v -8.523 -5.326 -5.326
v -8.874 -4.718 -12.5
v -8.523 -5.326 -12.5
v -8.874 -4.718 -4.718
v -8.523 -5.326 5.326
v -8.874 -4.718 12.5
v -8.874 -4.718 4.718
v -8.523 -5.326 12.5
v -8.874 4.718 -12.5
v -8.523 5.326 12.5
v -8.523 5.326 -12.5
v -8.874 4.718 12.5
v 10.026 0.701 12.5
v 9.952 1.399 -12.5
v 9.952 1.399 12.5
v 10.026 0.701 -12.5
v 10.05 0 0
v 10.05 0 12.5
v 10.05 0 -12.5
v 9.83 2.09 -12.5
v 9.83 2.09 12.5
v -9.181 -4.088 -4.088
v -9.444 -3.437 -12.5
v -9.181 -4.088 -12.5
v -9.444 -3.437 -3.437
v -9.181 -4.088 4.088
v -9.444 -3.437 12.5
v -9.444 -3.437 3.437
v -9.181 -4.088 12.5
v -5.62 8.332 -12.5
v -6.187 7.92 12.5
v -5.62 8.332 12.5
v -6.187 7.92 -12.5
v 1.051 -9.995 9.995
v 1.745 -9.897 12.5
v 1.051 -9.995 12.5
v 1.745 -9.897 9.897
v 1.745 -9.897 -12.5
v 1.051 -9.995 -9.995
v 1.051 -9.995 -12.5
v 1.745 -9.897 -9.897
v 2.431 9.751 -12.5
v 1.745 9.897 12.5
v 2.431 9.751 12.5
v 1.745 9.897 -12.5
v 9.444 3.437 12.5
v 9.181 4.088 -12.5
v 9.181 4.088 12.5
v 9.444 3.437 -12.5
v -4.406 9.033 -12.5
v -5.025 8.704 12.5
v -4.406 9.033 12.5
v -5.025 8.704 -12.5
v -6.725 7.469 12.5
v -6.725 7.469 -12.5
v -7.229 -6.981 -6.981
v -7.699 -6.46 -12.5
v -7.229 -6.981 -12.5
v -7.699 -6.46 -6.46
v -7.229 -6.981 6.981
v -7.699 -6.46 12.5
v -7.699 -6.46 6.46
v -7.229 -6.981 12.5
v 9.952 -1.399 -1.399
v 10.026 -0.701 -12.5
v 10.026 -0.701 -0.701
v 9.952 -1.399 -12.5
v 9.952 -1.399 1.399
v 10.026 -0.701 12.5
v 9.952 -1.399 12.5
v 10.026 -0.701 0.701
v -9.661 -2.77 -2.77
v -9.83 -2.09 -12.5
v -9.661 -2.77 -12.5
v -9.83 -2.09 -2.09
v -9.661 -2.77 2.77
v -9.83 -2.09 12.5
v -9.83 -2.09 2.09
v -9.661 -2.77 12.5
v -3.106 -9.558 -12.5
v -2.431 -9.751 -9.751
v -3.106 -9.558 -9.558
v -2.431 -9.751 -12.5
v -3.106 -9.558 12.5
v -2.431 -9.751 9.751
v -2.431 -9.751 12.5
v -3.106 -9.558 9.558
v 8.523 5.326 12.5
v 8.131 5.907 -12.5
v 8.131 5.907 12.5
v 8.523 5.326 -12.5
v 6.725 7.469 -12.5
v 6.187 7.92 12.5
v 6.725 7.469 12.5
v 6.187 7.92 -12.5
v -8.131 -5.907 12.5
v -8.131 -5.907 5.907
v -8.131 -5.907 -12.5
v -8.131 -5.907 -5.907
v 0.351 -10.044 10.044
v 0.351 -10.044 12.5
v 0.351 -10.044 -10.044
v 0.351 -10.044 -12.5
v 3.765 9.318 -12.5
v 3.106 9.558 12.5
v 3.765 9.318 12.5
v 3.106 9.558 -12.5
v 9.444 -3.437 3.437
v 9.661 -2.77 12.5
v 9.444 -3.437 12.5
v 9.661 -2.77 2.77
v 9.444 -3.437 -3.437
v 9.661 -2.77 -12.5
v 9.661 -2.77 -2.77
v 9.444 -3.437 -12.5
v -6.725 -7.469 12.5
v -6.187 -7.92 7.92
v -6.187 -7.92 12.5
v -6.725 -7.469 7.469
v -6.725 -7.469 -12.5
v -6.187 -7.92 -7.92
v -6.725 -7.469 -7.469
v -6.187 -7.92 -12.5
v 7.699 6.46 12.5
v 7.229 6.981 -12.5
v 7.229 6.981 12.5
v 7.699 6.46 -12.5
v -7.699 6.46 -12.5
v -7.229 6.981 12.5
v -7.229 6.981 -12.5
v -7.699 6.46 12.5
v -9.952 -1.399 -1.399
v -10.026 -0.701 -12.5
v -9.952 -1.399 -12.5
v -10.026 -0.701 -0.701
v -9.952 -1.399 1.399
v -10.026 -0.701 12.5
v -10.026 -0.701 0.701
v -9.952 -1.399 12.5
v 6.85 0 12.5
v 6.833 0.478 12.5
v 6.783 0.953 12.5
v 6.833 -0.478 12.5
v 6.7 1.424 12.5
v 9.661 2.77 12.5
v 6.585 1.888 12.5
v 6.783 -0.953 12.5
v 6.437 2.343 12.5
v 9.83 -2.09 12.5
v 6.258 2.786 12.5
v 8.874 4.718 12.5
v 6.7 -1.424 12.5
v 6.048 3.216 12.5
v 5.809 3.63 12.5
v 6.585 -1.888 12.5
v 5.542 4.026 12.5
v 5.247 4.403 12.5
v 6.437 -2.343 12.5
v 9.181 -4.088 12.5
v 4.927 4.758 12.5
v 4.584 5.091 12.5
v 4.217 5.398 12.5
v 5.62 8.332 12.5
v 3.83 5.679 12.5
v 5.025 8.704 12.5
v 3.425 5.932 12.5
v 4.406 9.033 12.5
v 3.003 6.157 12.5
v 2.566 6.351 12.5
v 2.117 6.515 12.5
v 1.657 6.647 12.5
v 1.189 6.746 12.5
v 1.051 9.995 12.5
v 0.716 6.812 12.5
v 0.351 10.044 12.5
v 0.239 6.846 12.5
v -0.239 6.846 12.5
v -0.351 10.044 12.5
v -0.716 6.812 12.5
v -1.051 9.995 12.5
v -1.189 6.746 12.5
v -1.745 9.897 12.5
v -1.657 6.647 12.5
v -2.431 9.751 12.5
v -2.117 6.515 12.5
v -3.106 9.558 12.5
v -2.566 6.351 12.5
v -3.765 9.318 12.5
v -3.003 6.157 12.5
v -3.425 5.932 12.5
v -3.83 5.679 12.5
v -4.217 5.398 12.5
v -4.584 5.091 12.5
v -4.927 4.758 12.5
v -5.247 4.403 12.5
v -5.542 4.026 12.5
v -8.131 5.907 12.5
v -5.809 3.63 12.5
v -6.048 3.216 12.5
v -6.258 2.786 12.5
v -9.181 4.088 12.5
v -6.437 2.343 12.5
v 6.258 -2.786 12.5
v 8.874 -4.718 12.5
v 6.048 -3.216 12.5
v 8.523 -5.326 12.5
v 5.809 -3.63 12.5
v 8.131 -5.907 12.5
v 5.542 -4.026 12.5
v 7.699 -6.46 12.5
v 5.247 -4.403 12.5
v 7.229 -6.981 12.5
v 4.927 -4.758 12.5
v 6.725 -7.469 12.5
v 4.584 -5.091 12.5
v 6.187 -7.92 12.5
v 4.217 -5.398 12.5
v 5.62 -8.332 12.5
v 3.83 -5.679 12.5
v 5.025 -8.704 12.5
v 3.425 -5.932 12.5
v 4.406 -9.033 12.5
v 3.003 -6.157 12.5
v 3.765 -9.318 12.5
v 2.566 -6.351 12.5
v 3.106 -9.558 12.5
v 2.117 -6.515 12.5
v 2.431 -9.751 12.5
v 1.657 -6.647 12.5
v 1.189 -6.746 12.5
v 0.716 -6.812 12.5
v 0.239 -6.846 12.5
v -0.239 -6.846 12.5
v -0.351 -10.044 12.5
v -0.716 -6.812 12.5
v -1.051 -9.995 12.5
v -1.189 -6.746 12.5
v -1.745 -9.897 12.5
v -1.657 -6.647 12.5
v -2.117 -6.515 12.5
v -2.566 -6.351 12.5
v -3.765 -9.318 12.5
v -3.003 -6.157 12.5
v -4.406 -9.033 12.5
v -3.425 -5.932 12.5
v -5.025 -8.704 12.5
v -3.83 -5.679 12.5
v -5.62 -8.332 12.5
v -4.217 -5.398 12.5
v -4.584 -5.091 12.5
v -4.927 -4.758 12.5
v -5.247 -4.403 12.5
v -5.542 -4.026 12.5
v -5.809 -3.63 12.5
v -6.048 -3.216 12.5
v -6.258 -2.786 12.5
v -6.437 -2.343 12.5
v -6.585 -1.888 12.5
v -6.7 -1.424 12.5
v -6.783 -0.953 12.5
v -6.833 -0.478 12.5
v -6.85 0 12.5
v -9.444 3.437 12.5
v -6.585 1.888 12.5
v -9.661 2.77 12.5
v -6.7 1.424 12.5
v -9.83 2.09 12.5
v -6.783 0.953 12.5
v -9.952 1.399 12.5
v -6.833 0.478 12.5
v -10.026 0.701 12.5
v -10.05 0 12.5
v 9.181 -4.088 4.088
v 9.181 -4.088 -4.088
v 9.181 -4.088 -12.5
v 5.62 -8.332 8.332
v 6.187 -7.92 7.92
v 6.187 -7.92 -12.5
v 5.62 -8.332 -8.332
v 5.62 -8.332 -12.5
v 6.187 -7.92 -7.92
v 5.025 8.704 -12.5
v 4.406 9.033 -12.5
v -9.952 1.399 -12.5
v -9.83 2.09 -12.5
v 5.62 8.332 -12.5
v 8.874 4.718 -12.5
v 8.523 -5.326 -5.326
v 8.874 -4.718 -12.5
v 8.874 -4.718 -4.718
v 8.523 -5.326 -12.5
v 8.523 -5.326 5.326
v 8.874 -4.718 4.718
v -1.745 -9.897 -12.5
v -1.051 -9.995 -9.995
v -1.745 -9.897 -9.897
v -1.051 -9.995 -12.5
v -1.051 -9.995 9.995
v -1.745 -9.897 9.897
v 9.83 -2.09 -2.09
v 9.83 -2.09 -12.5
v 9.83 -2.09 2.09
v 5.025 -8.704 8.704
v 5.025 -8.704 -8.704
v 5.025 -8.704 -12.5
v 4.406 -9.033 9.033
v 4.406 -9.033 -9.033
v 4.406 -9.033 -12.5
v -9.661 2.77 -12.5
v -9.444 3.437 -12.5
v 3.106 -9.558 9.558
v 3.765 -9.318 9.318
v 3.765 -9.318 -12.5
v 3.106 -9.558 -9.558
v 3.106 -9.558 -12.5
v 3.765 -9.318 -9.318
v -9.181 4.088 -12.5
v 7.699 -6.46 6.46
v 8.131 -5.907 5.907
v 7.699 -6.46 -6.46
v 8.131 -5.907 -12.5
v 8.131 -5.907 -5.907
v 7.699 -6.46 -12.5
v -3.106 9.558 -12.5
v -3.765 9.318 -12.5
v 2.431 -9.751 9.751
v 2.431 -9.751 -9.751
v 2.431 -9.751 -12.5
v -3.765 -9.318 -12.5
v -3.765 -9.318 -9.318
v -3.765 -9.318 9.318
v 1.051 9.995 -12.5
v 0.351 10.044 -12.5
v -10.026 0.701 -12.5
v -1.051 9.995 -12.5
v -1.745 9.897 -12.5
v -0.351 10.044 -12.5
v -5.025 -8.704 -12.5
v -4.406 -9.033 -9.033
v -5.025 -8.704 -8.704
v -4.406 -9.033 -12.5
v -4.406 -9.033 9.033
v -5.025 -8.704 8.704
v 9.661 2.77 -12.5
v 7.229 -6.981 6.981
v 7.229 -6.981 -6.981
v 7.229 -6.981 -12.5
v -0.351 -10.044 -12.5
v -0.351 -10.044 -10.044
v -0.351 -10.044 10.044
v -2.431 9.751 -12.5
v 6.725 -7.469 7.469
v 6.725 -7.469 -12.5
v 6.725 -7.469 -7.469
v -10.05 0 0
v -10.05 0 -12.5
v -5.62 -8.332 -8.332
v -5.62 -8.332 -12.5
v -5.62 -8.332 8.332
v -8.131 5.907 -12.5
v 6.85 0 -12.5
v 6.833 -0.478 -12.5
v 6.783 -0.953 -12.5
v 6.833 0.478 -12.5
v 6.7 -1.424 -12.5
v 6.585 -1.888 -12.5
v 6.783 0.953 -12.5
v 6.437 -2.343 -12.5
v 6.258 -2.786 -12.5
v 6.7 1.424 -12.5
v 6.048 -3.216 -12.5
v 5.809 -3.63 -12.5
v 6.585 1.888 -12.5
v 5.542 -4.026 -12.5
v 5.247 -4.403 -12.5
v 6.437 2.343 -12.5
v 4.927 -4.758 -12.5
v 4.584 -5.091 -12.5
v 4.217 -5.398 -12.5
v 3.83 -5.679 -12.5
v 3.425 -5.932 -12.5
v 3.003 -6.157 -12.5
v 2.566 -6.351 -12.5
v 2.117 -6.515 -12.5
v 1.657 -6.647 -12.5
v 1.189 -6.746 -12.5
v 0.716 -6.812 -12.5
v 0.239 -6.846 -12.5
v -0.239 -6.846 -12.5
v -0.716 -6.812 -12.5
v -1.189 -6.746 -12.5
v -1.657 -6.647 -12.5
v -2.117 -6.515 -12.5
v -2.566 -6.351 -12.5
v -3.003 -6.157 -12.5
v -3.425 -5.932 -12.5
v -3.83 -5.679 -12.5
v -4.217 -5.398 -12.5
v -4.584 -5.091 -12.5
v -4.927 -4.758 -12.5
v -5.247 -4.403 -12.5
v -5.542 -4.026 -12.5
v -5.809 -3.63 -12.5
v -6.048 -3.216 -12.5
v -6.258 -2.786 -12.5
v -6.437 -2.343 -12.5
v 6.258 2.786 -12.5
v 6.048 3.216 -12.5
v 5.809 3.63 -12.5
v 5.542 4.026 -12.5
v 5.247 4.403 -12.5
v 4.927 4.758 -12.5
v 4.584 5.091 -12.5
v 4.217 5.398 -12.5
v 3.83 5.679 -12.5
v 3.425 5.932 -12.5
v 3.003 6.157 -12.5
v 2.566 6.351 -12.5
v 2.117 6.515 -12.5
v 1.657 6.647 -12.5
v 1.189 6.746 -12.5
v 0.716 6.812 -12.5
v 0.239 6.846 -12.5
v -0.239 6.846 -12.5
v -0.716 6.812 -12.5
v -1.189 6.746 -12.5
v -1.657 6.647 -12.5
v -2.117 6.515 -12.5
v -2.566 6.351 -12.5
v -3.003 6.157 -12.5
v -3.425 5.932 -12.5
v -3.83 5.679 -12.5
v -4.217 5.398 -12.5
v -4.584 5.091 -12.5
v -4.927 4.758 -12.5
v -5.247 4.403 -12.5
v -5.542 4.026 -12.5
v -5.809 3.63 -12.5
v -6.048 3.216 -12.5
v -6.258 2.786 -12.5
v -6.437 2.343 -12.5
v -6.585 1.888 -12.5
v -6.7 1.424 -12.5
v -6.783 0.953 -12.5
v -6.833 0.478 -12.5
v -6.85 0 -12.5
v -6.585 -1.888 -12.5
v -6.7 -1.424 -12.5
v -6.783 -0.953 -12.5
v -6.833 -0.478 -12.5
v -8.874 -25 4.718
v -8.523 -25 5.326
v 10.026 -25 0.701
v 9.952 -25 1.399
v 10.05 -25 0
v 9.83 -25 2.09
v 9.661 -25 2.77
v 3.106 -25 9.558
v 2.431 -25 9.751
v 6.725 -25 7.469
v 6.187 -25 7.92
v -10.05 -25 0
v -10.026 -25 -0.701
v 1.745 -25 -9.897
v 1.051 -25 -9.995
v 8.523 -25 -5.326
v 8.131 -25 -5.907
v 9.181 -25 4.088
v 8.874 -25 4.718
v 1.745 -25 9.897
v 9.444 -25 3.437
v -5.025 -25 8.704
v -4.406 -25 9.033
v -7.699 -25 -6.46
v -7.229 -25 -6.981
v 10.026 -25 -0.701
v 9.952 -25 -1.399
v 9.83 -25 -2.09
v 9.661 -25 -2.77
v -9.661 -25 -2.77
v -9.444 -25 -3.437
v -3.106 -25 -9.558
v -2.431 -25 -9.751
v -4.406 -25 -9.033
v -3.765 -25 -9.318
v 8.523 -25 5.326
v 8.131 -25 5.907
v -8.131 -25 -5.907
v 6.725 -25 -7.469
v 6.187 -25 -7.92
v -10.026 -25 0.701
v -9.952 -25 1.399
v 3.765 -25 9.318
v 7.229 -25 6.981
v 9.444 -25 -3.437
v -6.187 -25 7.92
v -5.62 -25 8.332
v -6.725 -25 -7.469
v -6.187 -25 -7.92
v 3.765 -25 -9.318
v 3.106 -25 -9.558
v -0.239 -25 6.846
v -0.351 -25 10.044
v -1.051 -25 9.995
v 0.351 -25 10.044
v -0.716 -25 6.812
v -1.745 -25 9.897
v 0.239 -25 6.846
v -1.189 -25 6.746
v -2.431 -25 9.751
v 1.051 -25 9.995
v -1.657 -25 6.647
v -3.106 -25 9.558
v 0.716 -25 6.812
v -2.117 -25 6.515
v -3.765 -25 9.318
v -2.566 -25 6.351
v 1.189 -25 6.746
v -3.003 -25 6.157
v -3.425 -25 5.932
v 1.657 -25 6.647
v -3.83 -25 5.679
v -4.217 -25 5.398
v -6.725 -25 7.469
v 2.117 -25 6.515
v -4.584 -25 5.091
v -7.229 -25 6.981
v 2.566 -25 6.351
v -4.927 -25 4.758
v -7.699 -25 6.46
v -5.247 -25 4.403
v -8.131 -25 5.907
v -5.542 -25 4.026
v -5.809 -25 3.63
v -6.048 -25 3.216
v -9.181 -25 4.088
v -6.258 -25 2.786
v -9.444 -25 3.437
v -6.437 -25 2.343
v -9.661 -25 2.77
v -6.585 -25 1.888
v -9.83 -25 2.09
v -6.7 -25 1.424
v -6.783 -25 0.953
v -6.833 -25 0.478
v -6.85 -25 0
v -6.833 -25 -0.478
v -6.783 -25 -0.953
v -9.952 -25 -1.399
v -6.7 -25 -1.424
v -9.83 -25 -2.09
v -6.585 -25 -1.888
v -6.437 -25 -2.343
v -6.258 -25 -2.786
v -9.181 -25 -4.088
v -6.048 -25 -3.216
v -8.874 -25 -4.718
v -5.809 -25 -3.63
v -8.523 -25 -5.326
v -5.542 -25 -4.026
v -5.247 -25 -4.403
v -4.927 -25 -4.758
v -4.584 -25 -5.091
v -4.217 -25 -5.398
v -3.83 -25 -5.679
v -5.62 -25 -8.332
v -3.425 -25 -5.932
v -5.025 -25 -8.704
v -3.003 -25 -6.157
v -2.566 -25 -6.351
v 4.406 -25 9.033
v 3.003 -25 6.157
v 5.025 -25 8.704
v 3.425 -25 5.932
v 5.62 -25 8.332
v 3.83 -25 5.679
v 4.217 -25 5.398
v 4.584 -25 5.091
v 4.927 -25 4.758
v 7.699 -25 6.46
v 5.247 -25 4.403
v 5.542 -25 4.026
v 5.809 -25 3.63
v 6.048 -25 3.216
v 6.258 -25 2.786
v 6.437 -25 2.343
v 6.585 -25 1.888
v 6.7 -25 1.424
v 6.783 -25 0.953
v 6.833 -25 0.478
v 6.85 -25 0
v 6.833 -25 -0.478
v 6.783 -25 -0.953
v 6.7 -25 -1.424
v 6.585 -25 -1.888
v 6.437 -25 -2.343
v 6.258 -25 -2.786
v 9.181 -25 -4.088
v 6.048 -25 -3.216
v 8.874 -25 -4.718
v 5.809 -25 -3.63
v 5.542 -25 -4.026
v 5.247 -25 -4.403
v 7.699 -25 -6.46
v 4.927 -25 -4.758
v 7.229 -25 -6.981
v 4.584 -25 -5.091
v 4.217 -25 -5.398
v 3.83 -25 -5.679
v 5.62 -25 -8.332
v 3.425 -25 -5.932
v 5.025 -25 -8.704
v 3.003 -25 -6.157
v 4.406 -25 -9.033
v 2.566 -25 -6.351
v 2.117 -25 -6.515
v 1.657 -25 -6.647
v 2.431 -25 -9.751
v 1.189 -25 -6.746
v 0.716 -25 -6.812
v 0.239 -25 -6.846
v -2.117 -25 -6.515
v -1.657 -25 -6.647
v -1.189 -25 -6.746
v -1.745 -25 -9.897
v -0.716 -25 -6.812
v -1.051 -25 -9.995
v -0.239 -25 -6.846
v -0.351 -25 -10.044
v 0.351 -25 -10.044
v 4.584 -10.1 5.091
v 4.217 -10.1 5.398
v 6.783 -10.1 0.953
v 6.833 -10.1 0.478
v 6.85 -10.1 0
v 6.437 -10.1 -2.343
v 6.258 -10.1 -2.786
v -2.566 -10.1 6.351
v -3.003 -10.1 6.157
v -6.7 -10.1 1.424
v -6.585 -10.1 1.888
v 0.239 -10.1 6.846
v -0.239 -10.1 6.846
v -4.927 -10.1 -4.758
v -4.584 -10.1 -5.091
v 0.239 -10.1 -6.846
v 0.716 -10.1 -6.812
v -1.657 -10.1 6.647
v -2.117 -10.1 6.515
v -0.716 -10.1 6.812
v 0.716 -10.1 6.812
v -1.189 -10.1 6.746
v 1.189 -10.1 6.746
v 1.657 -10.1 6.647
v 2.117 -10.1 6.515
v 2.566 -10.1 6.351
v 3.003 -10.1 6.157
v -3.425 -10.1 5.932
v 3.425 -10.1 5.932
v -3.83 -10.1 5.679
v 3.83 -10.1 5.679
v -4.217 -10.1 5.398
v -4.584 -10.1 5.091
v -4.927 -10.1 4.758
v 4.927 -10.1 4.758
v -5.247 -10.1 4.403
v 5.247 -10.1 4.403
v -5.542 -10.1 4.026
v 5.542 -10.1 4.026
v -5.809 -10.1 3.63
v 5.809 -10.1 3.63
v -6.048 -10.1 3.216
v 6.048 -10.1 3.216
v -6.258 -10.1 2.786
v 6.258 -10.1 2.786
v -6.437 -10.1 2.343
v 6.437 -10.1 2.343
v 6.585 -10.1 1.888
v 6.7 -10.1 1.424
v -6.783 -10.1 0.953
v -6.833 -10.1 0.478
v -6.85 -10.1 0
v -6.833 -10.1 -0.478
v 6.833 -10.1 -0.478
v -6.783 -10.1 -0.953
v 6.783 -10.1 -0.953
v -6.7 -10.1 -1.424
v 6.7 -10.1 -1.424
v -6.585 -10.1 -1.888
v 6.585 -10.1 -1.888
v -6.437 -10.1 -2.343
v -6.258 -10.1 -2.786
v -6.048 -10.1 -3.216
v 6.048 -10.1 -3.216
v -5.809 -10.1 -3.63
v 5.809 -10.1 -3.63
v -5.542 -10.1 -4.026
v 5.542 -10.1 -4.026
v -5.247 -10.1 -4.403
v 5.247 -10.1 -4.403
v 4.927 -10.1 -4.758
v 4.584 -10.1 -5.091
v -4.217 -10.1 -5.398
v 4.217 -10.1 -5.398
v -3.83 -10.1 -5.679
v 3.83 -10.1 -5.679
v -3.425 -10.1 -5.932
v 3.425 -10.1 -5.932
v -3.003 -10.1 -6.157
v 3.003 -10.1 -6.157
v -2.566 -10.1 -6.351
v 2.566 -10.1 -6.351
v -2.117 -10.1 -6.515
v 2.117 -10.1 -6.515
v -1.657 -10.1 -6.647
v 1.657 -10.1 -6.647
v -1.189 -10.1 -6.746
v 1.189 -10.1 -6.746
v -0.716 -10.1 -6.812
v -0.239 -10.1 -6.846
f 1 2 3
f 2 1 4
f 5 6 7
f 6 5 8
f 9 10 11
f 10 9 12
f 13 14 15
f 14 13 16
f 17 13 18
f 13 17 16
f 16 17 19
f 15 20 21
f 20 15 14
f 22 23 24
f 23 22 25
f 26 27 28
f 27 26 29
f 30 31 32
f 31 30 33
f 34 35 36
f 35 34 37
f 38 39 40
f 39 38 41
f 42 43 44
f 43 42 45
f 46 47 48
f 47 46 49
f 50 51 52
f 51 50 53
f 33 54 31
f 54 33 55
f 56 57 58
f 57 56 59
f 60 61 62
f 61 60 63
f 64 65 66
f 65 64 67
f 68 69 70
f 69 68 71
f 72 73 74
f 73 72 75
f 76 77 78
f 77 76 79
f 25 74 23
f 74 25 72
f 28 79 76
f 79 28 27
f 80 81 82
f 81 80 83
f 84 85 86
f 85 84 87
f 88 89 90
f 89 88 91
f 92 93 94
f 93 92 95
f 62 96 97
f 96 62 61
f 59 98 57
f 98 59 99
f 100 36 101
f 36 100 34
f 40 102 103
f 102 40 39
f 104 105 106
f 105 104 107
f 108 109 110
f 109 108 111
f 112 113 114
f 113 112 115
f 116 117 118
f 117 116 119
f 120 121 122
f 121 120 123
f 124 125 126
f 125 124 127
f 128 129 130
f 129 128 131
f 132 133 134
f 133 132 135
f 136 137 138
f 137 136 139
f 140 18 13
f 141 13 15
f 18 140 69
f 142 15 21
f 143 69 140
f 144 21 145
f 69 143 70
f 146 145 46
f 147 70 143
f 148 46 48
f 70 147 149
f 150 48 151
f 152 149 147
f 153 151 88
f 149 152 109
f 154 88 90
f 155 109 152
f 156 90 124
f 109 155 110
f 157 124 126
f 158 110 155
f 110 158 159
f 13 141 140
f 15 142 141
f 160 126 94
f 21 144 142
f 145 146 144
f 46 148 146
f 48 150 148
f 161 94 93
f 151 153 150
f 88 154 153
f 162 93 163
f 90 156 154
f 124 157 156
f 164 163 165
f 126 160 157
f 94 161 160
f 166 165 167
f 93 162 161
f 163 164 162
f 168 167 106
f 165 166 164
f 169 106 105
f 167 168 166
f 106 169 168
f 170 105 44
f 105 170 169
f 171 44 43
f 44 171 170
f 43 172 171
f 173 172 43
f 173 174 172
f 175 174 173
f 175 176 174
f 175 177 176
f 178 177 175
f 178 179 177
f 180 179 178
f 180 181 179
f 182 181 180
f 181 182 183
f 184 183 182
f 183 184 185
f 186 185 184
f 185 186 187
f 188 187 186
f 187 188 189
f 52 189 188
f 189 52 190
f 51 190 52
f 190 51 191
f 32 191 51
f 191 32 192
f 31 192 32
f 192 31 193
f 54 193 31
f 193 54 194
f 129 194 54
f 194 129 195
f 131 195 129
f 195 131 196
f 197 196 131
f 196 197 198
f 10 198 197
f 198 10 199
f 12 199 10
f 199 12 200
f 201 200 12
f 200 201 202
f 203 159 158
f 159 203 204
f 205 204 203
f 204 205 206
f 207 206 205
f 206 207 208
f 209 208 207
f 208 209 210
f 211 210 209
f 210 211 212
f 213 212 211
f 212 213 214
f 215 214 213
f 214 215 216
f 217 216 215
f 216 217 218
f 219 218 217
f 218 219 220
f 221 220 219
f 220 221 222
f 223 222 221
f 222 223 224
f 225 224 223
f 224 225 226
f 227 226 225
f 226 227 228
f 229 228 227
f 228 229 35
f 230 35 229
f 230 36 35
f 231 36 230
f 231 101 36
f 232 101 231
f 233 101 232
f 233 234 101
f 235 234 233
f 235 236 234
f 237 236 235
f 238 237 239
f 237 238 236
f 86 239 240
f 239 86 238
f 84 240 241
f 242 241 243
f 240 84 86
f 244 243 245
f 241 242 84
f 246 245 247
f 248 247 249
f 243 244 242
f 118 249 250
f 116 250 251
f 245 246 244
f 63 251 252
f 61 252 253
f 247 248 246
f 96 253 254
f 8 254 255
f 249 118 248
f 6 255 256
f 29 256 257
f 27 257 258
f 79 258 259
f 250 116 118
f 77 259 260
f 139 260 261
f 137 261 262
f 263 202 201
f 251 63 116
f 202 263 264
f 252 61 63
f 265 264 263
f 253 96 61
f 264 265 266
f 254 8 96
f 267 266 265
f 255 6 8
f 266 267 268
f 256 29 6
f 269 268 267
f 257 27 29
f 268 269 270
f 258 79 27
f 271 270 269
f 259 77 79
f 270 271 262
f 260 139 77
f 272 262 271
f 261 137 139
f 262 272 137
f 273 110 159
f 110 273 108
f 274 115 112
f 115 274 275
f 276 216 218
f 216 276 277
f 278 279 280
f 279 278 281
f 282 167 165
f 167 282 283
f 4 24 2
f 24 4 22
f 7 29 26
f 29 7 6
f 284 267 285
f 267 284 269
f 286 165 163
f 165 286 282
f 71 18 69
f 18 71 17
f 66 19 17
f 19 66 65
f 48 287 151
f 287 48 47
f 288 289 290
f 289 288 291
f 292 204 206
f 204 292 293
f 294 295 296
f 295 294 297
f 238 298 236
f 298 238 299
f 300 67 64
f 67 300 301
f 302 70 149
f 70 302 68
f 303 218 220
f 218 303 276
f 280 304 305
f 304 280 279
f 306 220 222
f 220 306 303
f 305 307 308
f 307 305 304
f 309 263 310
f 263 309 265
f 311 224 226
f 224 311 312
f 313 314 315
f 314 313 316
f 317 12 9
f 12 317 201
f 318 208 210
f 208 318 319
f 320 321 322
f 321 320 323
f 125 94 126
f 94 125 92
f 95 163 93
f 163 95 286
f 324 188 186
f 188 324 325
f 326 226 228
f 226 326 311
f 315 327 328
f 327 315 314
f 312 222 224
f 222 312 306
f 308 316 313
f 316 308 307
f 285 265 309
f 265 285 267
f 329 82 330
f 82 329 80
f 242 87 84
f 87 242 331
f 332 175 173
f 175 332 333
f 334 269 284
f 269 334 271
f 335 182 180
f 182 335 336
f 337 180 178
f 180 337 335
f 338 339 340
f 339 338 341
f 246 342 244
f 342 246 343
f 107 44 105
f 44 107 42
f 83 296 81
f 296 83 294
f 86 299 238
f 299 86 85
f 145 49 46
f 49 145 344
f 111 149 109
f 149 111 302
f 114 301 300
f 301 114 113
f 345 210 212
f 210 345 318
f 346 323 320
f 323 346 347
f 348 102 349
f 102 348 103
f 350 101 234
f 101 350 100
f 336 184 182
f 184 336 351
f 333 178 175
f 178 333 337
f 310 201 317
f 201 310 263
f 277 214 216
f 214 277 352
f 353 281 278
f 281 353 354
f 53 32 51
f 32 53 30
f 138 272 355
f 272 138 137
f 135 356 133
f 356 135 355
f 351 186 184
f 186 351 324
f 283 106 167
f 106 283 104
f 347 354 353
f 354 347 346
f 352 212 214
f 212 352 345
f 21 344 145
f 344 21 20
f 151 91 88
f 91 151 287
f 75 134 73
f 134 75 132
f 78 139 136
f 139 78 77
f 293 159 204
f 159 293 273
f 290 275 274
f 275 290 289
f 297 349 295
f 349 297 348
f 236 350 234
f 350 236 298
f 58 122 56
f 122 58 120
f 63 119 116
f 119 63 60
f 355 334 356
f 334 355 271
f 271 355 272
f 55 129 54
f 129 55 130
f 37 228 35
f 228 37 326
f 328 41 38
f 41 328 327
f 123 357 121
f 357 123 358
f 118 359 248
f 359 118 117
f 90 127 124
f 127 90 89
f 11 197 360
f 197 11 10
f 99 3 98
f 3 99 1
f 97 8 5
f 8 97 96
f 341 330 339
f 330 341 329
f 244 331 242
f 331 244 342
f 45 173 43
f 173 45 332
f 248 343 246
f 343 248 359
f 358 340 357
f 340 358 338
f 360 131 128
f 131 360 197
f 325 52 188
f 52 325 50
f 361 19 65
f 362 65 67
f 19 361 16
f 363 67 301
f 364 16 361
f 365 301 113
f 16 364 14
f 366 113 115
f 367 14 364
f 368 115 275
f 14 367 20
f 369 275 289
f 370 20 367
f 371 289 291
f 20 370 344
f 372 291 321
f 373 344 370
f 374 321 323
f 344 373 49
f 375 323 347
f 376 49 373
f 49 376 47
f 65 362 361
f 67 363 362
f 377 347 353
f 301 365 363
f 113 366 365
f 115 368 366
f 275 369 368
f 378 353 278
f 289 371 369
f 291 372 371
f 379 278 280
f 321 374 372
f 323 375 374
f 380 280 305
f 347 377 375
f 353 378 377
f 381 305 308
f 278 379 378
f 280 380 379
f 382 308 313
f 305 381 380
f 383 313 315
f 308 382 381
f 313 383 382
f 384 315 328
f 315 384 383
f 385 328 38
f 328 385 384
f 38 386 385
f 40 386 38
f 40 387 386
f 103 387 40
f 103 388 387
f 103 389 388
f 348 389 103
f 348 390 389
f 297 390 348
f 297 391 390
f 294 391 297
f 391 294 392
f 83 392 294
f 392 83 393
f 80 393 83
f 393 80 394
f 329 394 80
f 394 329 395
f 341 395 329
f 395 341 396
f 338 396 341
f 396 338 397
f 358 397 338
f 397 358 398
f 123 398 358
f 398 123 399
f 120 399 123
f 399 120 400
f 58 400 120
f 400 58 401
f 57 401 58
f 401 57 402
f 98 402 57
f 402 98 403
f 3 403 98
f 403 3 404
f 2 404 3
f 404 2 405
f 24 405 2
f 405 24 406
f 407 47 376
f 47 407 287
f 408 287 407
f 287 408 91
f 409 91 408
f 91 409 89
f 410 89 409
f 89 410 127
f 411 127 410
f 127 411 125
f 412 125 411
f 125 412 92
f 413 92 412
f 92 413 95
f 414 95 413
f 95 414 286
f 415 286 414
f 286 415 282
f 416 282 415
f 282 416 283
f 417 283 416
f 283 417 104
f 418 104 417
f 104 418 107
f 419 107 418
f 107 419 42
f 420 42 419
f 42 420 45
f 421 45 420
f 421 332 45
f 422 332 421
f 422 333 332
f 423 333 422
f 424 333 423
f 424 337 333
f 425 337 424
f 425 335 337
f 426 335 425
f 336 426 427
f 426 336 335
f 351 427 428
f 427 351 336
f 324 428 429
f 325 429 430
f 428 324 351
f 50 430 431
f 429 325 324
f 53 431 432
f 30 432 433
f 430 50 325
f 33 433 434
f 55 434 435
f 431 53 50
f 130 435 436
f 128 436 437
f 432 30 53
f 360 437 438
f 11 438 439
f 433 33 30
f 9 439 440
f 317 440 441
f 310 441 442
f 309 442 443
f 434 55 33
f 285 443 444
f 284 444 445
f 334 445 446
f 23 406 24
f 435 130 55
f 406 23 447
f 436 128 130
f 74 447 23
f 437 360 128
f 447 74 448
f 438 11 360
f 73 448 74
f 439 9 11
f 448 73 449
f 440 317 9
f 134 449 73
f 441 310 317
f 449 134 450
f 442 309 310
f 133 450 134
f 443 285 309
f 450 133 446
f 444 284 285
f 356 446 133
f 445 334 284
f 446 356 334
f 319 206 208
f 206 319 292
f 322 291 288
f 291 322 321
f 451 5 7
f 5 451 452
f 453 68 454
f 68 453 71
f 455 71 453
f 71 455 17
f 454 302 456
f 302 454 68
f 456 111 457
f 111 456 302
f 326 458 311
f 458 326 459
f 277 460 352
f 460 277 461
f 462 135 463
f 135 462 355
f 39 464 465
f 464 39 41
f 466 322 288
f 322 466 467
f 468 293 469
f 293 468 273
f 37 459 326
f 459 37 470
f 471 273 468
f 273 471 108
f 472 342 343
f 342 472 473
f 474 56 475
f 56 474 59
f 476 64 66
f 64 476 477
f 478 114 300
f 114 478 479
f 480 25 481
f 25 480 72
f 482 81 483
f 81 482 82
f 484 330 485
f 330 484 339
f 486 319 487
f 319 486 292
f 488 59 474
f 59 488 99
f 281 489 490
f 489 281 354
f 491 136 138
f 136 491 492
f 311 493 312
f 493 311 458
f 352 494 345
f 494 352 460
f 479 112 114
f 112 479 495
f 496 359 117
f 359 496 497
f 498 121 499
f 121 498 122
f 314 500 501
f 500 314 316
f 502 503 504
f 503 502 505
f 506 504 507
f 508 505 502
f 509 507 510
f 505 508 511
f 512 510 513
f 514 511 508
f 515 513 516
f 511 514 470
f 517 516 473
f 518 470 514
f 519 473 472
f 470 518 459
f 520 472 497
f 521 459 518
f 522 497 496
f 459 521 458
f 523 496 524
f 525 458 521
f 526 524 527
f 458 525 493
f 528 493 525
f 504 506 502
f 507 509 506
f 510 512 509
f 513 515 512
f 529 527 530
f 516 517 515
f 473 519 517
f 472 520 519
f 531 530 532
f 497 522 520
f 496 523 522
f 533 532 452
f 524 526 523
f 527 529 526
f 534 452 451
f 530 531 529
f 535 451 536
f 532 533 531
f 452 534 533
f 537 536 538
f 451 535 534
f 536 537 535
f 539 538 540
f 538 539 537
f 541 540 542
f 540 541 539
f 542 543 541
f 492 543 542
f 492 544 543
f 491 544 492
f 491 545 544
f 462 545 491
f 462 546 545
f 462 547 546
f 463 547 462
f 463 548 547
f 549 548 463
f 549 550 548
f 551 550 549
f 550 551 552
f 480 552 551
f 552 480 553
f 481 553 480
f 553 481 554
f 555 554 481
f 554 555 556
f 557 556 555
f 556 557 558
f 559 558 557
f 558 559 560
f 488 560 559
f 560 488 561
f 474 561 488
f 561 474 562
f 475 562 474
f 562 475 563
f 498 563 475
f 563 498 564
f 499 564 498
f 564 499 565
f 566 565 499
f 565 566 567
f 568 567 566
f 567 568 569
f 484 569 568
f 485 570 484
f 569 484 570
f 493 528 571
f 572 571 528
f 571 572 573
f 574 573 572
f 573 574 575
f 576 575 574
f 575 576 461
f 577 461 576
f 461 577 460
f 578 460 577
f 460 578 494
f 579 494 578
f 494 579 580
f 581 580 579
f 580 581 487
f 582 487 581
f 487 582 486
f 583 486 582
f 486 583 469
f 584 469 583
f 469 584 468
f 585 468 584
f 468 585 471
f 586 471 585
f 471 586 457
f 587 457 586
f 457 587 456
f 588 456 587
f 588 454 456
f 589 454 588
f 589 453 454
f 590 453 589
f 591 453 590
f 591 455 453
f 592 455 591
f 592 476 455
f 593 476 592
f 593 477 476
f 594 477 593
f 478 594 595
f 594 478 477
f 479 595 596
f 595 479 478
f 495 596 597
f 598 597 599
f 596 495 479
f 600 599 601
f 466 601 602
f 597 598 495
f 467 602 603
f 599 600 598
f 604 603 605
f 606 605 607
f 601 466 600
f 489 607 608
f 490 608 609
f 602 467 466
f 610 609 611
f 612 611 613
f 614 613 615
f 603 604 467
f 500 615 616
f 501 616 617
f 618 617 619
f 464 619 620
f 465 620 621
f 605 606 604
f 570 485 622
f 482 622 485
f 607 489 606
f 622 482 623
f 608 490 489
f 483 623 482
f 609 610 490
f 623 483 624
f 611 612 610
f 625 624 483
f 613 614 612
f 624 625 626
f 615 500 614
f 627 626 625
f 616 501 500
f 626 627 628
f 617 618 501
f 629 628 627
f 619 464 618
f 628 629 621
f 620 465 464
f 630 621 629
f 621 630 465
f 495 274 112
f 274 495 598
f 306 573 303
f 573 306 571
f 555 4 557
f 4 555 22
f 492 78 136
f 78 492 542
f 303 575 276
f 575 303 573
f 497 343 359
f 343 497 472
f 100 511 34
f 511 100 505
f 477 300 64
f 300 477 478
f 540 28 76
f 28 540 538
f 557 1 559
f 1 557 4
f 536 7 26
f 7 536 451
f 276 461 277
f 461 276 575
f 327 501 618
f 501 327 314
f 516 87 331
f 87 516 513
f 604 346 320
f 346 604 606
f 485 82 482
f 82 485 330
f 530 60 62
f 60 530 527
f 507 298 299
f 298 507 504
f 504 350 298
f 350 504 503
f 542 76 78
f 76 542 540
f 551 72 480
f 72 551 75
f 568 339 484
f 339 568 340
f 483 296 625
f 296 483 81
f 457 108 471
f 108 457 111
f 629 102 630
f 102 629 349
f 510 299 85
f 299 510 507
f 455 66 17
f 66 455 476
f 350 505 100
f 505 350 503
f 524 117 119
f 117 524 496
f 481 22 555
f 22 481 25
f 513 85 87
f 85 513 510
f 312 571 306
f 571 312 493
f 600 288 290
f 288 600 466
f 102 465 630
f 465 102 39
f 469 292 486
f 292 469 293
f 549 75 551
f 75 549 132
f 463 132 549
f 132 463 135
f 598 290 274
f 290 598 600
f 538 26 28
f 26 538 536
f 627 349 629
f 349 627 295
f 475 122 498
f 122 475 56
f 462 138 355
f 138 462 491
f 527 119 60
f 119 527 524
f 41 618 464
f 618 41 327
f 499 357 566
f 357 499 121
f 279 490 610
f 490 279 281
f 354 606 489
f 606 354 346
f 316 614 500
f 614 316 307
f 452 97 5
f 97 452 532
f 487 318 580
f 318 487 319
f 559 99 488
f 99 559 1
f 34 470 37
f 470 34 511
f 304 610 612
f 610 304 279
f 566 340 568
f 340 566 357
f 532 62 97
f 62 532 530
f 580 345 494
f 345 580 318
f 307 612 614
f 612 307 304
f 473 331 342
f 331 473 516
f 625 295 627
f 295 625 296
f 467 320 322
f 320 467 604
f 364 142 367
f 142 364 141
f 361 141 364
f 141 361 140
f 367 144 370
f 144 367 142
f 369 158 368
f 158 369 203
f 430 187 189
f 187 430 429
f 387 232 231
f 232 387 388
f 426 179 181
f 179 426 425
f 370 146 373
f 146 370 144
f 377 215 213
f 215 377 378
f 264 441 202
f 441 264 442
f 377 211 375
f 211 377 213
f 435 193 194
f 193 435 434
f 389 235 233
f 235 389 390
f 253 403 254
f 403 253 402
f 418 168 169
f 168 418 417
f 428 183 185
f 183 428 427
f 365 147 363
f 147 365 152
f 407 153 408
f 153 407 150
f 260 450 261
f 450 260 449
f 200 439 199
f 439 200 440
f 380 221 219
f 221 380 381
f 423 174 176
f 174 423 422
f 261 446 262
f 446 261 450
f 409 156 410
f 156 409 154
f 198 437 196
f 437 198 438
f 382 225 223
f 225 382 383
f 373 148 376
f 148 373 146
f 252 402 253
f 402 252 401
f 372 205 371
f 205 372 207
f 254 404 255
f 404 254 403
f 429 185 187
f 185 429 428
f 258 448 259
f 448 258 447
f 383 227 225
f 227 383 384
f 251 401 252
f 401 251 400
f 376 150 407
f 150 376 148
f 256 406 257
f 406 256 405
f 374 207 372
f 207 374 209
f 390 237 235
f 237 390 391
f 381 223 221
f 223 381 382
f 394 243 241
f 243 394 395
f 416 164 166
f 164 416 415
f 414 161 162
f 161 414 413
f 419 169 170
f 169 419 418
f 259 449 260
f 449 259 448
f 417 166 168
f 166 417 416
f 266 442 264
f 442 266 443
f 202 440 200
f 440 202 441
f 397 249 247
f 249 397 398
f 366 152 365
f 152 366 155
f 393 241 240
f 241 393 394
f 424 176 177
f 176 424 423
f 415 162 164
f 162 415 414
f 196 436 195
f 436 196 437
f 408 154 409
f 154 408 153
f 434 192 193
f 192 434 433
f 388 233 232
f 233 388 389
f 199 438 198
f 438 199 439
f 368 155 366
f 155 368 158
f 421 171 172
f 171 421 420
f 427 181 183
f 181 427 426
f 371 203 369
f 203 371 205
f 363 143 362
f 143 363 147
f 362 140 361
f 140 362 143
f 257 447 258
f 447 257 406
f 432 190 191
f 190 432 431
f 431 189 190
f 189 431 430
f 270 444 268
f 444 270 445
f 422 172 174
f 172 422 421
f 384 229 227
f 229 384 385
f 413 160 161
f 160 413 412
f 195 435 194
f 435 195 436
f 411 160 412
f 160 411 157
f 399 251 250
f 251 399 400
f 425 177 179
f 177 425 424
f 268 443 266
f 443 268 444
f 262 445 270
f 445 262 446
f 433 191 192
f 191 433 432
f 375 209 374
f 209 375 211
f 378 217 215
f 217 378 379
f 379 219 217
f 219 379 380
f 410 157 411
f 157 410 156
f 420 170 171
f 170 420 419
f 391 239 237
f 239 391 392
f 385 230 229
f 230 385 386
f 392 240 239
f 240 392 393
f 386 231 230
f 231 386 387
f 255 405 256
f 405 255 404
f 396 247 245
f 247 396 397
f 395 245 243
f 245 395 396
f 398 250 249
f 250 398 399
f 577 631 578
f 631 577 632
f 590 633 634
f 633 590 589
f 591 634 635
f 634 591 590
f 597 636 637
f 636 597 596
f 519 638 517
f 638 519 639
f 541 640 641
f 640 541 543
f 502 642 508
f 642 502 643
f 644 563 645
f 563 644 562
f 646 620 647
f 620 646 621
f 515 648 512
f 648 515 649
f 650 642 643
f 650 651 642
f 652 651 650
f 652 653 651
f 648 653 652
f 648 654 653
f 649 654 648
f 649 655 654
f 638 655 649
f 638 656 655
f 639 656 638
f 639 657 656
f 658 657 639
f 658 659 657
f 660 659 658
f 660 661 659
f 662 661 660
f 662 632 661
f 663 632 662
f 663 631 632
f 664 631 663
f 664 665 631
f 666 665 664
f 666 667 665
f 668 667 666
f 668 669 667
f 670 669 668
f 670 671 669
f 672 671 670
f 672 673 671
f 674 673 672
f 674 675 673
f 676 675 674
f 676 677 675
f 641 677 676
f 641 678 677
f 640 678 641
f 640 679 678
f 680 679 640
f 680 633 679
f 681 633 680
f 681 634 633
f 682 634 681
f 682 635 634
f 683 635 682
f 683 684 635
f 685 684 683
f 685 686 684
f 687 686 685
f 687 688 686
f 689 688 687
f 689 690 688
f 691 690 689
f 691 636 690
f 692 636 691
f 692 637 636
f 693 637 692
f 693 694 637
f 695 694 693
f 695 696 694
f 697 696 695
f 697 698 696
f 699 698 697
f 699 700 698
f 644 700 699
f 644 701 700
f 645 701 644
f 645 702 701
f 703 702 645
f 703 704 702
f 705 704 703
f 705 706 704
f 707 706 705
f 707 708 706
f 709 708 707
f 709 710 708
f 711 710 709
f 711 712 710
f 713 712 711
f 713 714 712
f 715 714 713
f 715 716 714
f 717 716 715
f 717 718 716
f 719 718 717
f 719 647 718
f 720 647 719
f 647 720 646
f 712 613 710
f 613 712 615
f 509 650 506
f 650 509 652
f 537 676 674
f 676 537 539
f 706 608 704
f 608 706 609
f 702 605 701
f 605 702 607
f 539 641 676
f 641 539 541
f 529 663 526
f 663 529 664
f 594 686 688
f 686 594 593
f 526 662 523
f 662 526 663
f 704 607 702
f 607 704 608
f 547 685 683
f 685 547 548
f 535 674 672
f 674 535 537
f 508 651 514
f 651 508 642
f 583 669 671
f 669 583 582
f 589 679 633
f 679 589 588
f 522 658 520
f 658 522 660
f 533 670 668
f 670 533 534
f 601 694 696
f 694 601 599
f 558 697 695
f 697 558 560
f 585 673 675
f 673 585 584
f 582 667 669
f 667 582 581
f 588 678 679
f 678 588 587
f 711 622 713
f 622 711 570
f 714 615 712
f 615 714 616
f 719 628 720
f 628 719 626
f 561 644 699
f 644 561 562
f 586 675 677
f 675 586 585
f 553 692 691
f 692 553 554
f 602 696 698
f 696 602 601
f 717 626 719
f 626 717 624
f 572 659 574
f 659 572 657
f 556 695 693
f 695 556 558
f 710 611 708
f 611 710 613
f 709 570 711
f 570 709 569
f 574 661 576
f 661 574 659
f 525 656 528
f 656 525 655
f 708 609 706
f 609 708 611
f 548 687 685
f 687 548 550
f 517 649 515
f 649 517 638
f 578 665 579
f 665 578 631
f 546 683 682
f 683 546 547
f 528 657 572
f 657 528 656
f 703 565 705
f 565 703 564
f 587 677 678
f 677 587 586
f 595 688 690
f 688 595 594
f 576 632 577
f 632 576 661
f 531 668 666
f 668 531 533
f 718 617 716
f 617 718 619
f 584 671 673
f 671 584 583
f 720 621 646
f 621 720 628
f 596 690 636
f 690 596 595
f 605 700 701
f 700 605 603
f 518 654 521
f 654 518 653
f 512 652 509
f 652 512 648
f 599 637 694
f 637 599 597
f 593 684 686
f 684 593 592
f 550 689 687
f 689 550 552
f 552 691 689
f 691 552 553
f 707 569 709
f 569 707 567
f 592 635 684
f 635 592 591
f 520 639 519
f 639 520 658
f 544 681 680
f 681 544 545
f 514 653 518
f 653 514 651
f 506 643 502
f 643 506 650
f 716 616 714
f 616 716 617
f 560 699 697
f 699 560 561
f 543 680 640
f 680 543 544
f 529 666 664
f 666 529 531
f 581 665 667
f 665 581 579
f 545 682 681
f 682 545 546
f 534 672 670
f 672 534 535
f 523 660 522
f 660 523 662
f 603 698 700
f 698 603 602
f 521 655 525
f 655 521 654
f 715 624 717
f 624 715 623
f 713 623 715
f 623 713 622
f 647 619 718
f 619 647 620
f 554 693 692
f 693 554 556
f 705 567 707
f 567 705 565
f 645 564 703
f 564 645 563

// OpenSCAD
$fa=4; // default minimum facet angle is now 0.5
$fs=0.05; // default minimum facet size is now 0.05 mm

tolerance = .1;

clampGap = .25;
pipeRad = 6.75 + tolerance;
insertDepth = 15;
totalLen = 25;
groundHeight = 14;
wallThickness = 3.2;

screwHeadExtraGap = .75;
screwRad = 1.5 + 4 * tolerance;
screwHeadRad = 2.25 + screwHeadExtraGap;
nutRad = 3.1 + tolerance;

difference() {
  union() {
    translate([0, 0, -totalLen / 2]) cylinder(h = totalLen, r = pipeRad + wallThickness);
    rotate([90, 0, 0]) cylinder(h = totalLen, r = pipeRad + wallThickness);
    // translate([-pipeRad - wallThickness, -totalLen, -groundHeight - pipeRad]) cube([(pipeRad + wallThickness) * 2, totalLen, groundHeight + pipeRad]);
  }

  union() {
    translate([0, 0, -totalLen / 2 - .1]) cylinder(h = totalLen + .2, r = pipeRad);
    translate([0, insertDepth - totalLen -.1, 0]) rotate([90, 0, 0]) cylinder(h = insertDepth + .1, r = pipeRad);
    // translate([clampGap, -50, -50]) cube([20, 100, 100]);
    // rotate([0, 90, 0]) cylinder(h = 50, r = screwRad, center=true);
    // translate([-5, 0, 0]) rotate([0, -90, 0]) linear_extrude(50) cylinder(h = 50, r = screwHeadRad);
  }
}

module hexagon(r = 1) {
  polygon([
    [-1 * r, 0],
    [-.5 * r, r * sqrt(3) / 2],
    [.5 * r, r * sqrt(3) / 2],
    [1 * r, 0],
    [.5 * r, r * sqrt(3) / -2],
    [-.5 * r, r * sqrt(3) / -2],
  ]);
}
